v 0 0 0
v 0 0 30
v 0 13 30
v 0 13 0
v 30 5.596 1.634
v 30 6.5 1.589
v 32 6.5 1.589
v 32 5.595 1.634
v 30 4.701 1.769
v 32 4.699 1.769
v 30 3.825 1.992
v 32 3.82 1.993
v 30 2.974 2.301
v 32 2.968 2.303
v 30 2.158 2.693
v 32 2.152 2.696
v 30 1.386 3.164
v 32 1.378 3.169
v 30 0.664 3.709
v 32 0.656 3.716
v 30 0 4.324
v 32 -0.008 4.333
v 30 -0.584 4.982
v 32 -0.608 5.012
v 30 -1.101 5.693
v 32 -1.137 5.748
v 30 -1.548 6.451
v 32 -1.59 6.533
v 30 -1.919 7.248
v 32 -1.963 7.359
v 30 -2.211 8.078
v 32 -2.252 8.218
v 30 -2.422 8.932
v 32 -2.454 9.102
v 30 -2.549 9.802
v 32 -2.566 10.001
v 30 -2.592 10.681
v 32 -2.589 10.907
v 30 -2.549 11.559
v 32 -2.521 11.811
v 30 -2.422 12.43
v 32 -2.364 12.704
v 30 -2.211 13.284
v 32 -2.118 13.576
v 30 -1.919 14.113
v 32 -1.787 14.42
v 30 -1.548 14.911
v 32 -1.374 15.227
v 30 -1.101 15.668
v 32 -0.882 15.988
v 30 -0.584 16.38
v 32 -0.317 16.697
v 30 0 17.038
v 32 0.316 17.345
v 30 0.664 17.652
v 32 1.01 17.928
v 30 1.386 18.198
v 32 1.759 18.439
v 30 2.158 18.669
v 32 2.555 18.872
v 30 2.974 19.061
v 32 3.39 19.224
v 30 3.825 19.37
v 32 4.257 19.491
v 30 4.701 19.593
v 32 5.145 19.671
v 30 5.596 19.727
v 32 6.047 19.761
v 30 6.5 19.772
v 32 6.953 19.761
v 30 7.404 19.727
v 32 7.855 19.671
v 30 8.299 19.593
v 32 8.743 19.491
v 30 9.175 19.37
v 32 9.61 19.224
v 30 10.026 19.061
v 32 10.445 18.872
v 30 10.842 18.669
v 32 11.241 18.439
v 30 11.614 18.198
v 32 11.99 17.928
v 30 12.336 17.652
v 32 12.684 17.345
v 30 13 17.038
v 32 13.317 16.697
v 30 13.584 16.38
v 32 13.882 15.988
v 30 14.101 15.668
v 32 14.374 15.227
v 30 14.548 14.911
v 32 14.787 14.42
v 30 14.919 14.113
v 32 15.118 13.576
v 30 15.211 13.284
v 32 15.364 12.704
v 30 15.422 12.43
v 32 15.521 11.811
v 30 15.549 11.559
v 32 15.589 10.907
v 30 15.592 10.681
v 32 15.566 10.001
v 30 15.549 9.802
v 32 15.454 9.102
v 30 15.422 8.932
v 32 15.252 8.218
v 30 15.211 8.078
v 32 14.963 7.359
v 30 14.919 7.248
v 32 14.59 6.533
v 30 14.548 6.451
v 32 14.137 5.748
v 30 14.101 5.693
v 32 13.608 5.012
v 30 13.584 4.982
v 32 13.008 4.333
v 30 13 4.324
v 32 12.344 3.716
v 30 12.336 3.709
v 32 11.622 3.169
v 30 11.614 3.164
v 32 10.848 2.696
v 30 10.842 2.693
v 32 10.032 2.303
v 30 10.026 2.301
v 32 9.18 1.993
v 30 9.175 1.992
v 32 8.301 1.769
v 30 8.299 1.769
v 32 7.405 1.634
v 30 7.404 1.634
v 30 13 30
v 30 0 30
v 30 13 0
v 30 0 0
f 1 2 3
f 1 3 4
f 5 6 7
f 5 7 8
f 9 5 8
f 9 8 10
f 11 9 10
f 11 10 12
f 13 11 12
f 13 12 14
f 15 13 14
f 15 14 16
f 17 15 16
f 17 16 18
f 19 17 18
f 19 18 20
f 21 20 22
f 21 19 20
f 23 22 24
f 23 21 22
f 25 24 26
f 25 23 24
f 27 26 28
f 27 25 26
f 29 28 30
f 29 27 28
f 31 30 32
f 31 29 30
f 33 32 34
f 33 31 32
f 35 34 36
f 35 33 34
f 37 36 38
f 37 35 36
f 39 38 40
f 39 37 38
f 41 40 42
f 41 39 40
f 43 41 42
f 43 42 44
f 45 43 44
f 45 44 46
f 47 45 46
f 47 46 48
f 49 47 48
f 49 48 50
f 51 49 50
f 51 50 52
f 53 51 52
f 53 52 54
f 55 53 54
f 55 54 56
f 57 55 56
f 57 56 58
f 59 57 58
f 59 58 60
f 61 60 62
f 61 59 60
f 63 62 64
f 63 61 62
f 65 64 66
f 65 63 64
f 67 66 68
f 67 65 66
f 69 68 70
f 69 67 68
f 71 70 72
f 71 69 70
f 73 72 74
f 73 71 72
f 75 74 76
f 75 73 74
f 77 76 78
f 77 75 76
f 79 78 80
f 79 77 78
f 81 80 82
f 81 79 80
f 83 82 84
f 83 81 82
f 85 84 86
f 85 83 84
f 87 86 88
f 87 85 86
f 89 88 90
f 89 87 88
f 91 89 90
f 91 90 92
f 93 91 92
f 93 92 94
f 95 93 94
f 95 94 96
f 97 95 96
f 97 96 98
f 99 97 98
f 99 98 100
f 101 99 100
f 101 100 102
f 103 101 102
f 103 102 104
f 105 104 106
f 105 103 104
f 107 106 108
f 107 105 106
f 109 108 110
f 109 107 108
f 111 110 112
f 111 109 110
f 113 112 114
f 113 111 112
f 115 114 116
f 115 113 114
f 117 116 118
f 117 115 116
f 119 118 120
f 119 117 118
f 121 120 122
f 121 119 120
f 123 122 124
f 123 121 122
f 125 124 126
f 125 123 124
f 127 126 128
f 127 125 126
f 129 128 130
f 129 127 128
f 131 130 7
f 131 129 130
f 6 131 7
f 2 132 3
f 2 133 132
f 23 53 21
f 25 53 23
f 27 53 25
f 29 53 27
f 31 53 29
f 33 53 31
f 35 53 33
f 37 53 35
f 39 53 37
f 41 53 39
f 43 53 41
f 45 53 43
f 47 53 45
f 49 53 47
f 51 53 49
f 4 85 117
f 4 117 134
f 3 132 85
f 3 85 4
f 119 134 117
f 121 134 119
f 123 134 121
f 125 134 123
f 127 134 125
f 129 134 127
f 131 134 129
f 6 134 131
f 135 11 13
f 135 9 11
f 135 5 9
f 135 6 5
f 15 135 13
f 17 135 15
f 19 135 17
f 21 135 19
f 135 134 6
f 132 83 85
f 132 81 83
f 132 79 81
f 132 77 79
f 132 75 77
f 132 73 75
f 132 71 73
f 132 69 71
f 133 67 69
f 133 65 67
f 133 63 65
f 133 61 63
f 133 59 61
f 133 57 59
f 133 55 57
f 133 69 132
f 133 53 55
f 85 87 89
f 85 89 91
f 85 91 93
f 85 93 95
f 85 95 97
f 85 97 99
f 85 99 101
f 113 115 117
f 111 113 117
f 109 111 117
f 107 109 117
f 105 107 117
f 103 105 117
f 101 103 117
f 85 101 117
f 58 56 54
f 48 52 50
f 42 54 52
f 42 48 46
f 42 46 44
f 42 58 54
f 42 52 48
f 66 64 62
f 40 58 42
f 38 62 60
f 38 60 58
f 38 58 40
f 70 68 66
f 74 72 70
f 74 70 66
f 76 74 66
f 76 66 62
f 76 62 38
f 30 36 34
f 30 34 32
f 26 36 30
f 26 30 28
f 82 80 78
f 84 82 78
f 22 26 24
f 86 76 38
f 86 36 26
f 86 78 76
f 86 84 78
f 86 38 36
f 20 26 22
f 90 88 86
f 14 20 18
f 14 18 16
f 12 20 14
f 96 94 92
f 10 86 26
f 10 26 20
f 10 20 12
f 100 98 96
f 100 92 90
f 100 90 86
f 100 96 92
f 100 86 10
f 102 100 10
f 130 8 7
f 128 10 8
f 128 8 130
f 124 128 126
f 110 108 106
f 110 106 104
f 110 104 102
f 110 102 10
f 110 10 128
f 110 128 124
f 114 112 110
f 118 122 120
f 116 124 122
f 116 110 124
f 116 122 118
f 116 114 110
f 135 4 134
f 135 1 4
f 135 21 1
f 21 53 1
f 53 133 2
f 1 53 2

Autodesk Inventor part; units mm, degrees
ref_plane "YZ Plane" through (0, 0, 0) normal (1, 0, 0) x (0, 1, 0)
ref_plane "XZ Plane" through (0, 0, 0) normal (0, 1, 0) x (-1, 0, 0)
ref_plane "XY Plane" through (0, 0, 0) normal (0, 0, 1) x (1, 0, 0)
sketch "Esquisse1" plane through (0, 0, 0) normal (0, 1, 0) x (-1, 0, 0)
  line L0 (0, 0) -> (-30, 0)
  line L1 (-30, 0) -> (-30, 30)
  line L2 (-30, 30) -> (0, 30)
  line L3 (0, 30) -> (0, 0)
  dimension "d0" = 30
  dimension "d2" = 30
extrude "Extrusion1" add sketch "Esquisse1" along normal blind 13
sketch "Esquisse2" plane through (30, 0, 30) normal (1, 0, 0) x (0, 0, -1)
  circle A0 centre (19.3193, 6.5) radius 9.0917
extrude "Extrusion2" add sketch "Esquisse2" along normal blind 2
properties part number "moteur euger 16_03"
